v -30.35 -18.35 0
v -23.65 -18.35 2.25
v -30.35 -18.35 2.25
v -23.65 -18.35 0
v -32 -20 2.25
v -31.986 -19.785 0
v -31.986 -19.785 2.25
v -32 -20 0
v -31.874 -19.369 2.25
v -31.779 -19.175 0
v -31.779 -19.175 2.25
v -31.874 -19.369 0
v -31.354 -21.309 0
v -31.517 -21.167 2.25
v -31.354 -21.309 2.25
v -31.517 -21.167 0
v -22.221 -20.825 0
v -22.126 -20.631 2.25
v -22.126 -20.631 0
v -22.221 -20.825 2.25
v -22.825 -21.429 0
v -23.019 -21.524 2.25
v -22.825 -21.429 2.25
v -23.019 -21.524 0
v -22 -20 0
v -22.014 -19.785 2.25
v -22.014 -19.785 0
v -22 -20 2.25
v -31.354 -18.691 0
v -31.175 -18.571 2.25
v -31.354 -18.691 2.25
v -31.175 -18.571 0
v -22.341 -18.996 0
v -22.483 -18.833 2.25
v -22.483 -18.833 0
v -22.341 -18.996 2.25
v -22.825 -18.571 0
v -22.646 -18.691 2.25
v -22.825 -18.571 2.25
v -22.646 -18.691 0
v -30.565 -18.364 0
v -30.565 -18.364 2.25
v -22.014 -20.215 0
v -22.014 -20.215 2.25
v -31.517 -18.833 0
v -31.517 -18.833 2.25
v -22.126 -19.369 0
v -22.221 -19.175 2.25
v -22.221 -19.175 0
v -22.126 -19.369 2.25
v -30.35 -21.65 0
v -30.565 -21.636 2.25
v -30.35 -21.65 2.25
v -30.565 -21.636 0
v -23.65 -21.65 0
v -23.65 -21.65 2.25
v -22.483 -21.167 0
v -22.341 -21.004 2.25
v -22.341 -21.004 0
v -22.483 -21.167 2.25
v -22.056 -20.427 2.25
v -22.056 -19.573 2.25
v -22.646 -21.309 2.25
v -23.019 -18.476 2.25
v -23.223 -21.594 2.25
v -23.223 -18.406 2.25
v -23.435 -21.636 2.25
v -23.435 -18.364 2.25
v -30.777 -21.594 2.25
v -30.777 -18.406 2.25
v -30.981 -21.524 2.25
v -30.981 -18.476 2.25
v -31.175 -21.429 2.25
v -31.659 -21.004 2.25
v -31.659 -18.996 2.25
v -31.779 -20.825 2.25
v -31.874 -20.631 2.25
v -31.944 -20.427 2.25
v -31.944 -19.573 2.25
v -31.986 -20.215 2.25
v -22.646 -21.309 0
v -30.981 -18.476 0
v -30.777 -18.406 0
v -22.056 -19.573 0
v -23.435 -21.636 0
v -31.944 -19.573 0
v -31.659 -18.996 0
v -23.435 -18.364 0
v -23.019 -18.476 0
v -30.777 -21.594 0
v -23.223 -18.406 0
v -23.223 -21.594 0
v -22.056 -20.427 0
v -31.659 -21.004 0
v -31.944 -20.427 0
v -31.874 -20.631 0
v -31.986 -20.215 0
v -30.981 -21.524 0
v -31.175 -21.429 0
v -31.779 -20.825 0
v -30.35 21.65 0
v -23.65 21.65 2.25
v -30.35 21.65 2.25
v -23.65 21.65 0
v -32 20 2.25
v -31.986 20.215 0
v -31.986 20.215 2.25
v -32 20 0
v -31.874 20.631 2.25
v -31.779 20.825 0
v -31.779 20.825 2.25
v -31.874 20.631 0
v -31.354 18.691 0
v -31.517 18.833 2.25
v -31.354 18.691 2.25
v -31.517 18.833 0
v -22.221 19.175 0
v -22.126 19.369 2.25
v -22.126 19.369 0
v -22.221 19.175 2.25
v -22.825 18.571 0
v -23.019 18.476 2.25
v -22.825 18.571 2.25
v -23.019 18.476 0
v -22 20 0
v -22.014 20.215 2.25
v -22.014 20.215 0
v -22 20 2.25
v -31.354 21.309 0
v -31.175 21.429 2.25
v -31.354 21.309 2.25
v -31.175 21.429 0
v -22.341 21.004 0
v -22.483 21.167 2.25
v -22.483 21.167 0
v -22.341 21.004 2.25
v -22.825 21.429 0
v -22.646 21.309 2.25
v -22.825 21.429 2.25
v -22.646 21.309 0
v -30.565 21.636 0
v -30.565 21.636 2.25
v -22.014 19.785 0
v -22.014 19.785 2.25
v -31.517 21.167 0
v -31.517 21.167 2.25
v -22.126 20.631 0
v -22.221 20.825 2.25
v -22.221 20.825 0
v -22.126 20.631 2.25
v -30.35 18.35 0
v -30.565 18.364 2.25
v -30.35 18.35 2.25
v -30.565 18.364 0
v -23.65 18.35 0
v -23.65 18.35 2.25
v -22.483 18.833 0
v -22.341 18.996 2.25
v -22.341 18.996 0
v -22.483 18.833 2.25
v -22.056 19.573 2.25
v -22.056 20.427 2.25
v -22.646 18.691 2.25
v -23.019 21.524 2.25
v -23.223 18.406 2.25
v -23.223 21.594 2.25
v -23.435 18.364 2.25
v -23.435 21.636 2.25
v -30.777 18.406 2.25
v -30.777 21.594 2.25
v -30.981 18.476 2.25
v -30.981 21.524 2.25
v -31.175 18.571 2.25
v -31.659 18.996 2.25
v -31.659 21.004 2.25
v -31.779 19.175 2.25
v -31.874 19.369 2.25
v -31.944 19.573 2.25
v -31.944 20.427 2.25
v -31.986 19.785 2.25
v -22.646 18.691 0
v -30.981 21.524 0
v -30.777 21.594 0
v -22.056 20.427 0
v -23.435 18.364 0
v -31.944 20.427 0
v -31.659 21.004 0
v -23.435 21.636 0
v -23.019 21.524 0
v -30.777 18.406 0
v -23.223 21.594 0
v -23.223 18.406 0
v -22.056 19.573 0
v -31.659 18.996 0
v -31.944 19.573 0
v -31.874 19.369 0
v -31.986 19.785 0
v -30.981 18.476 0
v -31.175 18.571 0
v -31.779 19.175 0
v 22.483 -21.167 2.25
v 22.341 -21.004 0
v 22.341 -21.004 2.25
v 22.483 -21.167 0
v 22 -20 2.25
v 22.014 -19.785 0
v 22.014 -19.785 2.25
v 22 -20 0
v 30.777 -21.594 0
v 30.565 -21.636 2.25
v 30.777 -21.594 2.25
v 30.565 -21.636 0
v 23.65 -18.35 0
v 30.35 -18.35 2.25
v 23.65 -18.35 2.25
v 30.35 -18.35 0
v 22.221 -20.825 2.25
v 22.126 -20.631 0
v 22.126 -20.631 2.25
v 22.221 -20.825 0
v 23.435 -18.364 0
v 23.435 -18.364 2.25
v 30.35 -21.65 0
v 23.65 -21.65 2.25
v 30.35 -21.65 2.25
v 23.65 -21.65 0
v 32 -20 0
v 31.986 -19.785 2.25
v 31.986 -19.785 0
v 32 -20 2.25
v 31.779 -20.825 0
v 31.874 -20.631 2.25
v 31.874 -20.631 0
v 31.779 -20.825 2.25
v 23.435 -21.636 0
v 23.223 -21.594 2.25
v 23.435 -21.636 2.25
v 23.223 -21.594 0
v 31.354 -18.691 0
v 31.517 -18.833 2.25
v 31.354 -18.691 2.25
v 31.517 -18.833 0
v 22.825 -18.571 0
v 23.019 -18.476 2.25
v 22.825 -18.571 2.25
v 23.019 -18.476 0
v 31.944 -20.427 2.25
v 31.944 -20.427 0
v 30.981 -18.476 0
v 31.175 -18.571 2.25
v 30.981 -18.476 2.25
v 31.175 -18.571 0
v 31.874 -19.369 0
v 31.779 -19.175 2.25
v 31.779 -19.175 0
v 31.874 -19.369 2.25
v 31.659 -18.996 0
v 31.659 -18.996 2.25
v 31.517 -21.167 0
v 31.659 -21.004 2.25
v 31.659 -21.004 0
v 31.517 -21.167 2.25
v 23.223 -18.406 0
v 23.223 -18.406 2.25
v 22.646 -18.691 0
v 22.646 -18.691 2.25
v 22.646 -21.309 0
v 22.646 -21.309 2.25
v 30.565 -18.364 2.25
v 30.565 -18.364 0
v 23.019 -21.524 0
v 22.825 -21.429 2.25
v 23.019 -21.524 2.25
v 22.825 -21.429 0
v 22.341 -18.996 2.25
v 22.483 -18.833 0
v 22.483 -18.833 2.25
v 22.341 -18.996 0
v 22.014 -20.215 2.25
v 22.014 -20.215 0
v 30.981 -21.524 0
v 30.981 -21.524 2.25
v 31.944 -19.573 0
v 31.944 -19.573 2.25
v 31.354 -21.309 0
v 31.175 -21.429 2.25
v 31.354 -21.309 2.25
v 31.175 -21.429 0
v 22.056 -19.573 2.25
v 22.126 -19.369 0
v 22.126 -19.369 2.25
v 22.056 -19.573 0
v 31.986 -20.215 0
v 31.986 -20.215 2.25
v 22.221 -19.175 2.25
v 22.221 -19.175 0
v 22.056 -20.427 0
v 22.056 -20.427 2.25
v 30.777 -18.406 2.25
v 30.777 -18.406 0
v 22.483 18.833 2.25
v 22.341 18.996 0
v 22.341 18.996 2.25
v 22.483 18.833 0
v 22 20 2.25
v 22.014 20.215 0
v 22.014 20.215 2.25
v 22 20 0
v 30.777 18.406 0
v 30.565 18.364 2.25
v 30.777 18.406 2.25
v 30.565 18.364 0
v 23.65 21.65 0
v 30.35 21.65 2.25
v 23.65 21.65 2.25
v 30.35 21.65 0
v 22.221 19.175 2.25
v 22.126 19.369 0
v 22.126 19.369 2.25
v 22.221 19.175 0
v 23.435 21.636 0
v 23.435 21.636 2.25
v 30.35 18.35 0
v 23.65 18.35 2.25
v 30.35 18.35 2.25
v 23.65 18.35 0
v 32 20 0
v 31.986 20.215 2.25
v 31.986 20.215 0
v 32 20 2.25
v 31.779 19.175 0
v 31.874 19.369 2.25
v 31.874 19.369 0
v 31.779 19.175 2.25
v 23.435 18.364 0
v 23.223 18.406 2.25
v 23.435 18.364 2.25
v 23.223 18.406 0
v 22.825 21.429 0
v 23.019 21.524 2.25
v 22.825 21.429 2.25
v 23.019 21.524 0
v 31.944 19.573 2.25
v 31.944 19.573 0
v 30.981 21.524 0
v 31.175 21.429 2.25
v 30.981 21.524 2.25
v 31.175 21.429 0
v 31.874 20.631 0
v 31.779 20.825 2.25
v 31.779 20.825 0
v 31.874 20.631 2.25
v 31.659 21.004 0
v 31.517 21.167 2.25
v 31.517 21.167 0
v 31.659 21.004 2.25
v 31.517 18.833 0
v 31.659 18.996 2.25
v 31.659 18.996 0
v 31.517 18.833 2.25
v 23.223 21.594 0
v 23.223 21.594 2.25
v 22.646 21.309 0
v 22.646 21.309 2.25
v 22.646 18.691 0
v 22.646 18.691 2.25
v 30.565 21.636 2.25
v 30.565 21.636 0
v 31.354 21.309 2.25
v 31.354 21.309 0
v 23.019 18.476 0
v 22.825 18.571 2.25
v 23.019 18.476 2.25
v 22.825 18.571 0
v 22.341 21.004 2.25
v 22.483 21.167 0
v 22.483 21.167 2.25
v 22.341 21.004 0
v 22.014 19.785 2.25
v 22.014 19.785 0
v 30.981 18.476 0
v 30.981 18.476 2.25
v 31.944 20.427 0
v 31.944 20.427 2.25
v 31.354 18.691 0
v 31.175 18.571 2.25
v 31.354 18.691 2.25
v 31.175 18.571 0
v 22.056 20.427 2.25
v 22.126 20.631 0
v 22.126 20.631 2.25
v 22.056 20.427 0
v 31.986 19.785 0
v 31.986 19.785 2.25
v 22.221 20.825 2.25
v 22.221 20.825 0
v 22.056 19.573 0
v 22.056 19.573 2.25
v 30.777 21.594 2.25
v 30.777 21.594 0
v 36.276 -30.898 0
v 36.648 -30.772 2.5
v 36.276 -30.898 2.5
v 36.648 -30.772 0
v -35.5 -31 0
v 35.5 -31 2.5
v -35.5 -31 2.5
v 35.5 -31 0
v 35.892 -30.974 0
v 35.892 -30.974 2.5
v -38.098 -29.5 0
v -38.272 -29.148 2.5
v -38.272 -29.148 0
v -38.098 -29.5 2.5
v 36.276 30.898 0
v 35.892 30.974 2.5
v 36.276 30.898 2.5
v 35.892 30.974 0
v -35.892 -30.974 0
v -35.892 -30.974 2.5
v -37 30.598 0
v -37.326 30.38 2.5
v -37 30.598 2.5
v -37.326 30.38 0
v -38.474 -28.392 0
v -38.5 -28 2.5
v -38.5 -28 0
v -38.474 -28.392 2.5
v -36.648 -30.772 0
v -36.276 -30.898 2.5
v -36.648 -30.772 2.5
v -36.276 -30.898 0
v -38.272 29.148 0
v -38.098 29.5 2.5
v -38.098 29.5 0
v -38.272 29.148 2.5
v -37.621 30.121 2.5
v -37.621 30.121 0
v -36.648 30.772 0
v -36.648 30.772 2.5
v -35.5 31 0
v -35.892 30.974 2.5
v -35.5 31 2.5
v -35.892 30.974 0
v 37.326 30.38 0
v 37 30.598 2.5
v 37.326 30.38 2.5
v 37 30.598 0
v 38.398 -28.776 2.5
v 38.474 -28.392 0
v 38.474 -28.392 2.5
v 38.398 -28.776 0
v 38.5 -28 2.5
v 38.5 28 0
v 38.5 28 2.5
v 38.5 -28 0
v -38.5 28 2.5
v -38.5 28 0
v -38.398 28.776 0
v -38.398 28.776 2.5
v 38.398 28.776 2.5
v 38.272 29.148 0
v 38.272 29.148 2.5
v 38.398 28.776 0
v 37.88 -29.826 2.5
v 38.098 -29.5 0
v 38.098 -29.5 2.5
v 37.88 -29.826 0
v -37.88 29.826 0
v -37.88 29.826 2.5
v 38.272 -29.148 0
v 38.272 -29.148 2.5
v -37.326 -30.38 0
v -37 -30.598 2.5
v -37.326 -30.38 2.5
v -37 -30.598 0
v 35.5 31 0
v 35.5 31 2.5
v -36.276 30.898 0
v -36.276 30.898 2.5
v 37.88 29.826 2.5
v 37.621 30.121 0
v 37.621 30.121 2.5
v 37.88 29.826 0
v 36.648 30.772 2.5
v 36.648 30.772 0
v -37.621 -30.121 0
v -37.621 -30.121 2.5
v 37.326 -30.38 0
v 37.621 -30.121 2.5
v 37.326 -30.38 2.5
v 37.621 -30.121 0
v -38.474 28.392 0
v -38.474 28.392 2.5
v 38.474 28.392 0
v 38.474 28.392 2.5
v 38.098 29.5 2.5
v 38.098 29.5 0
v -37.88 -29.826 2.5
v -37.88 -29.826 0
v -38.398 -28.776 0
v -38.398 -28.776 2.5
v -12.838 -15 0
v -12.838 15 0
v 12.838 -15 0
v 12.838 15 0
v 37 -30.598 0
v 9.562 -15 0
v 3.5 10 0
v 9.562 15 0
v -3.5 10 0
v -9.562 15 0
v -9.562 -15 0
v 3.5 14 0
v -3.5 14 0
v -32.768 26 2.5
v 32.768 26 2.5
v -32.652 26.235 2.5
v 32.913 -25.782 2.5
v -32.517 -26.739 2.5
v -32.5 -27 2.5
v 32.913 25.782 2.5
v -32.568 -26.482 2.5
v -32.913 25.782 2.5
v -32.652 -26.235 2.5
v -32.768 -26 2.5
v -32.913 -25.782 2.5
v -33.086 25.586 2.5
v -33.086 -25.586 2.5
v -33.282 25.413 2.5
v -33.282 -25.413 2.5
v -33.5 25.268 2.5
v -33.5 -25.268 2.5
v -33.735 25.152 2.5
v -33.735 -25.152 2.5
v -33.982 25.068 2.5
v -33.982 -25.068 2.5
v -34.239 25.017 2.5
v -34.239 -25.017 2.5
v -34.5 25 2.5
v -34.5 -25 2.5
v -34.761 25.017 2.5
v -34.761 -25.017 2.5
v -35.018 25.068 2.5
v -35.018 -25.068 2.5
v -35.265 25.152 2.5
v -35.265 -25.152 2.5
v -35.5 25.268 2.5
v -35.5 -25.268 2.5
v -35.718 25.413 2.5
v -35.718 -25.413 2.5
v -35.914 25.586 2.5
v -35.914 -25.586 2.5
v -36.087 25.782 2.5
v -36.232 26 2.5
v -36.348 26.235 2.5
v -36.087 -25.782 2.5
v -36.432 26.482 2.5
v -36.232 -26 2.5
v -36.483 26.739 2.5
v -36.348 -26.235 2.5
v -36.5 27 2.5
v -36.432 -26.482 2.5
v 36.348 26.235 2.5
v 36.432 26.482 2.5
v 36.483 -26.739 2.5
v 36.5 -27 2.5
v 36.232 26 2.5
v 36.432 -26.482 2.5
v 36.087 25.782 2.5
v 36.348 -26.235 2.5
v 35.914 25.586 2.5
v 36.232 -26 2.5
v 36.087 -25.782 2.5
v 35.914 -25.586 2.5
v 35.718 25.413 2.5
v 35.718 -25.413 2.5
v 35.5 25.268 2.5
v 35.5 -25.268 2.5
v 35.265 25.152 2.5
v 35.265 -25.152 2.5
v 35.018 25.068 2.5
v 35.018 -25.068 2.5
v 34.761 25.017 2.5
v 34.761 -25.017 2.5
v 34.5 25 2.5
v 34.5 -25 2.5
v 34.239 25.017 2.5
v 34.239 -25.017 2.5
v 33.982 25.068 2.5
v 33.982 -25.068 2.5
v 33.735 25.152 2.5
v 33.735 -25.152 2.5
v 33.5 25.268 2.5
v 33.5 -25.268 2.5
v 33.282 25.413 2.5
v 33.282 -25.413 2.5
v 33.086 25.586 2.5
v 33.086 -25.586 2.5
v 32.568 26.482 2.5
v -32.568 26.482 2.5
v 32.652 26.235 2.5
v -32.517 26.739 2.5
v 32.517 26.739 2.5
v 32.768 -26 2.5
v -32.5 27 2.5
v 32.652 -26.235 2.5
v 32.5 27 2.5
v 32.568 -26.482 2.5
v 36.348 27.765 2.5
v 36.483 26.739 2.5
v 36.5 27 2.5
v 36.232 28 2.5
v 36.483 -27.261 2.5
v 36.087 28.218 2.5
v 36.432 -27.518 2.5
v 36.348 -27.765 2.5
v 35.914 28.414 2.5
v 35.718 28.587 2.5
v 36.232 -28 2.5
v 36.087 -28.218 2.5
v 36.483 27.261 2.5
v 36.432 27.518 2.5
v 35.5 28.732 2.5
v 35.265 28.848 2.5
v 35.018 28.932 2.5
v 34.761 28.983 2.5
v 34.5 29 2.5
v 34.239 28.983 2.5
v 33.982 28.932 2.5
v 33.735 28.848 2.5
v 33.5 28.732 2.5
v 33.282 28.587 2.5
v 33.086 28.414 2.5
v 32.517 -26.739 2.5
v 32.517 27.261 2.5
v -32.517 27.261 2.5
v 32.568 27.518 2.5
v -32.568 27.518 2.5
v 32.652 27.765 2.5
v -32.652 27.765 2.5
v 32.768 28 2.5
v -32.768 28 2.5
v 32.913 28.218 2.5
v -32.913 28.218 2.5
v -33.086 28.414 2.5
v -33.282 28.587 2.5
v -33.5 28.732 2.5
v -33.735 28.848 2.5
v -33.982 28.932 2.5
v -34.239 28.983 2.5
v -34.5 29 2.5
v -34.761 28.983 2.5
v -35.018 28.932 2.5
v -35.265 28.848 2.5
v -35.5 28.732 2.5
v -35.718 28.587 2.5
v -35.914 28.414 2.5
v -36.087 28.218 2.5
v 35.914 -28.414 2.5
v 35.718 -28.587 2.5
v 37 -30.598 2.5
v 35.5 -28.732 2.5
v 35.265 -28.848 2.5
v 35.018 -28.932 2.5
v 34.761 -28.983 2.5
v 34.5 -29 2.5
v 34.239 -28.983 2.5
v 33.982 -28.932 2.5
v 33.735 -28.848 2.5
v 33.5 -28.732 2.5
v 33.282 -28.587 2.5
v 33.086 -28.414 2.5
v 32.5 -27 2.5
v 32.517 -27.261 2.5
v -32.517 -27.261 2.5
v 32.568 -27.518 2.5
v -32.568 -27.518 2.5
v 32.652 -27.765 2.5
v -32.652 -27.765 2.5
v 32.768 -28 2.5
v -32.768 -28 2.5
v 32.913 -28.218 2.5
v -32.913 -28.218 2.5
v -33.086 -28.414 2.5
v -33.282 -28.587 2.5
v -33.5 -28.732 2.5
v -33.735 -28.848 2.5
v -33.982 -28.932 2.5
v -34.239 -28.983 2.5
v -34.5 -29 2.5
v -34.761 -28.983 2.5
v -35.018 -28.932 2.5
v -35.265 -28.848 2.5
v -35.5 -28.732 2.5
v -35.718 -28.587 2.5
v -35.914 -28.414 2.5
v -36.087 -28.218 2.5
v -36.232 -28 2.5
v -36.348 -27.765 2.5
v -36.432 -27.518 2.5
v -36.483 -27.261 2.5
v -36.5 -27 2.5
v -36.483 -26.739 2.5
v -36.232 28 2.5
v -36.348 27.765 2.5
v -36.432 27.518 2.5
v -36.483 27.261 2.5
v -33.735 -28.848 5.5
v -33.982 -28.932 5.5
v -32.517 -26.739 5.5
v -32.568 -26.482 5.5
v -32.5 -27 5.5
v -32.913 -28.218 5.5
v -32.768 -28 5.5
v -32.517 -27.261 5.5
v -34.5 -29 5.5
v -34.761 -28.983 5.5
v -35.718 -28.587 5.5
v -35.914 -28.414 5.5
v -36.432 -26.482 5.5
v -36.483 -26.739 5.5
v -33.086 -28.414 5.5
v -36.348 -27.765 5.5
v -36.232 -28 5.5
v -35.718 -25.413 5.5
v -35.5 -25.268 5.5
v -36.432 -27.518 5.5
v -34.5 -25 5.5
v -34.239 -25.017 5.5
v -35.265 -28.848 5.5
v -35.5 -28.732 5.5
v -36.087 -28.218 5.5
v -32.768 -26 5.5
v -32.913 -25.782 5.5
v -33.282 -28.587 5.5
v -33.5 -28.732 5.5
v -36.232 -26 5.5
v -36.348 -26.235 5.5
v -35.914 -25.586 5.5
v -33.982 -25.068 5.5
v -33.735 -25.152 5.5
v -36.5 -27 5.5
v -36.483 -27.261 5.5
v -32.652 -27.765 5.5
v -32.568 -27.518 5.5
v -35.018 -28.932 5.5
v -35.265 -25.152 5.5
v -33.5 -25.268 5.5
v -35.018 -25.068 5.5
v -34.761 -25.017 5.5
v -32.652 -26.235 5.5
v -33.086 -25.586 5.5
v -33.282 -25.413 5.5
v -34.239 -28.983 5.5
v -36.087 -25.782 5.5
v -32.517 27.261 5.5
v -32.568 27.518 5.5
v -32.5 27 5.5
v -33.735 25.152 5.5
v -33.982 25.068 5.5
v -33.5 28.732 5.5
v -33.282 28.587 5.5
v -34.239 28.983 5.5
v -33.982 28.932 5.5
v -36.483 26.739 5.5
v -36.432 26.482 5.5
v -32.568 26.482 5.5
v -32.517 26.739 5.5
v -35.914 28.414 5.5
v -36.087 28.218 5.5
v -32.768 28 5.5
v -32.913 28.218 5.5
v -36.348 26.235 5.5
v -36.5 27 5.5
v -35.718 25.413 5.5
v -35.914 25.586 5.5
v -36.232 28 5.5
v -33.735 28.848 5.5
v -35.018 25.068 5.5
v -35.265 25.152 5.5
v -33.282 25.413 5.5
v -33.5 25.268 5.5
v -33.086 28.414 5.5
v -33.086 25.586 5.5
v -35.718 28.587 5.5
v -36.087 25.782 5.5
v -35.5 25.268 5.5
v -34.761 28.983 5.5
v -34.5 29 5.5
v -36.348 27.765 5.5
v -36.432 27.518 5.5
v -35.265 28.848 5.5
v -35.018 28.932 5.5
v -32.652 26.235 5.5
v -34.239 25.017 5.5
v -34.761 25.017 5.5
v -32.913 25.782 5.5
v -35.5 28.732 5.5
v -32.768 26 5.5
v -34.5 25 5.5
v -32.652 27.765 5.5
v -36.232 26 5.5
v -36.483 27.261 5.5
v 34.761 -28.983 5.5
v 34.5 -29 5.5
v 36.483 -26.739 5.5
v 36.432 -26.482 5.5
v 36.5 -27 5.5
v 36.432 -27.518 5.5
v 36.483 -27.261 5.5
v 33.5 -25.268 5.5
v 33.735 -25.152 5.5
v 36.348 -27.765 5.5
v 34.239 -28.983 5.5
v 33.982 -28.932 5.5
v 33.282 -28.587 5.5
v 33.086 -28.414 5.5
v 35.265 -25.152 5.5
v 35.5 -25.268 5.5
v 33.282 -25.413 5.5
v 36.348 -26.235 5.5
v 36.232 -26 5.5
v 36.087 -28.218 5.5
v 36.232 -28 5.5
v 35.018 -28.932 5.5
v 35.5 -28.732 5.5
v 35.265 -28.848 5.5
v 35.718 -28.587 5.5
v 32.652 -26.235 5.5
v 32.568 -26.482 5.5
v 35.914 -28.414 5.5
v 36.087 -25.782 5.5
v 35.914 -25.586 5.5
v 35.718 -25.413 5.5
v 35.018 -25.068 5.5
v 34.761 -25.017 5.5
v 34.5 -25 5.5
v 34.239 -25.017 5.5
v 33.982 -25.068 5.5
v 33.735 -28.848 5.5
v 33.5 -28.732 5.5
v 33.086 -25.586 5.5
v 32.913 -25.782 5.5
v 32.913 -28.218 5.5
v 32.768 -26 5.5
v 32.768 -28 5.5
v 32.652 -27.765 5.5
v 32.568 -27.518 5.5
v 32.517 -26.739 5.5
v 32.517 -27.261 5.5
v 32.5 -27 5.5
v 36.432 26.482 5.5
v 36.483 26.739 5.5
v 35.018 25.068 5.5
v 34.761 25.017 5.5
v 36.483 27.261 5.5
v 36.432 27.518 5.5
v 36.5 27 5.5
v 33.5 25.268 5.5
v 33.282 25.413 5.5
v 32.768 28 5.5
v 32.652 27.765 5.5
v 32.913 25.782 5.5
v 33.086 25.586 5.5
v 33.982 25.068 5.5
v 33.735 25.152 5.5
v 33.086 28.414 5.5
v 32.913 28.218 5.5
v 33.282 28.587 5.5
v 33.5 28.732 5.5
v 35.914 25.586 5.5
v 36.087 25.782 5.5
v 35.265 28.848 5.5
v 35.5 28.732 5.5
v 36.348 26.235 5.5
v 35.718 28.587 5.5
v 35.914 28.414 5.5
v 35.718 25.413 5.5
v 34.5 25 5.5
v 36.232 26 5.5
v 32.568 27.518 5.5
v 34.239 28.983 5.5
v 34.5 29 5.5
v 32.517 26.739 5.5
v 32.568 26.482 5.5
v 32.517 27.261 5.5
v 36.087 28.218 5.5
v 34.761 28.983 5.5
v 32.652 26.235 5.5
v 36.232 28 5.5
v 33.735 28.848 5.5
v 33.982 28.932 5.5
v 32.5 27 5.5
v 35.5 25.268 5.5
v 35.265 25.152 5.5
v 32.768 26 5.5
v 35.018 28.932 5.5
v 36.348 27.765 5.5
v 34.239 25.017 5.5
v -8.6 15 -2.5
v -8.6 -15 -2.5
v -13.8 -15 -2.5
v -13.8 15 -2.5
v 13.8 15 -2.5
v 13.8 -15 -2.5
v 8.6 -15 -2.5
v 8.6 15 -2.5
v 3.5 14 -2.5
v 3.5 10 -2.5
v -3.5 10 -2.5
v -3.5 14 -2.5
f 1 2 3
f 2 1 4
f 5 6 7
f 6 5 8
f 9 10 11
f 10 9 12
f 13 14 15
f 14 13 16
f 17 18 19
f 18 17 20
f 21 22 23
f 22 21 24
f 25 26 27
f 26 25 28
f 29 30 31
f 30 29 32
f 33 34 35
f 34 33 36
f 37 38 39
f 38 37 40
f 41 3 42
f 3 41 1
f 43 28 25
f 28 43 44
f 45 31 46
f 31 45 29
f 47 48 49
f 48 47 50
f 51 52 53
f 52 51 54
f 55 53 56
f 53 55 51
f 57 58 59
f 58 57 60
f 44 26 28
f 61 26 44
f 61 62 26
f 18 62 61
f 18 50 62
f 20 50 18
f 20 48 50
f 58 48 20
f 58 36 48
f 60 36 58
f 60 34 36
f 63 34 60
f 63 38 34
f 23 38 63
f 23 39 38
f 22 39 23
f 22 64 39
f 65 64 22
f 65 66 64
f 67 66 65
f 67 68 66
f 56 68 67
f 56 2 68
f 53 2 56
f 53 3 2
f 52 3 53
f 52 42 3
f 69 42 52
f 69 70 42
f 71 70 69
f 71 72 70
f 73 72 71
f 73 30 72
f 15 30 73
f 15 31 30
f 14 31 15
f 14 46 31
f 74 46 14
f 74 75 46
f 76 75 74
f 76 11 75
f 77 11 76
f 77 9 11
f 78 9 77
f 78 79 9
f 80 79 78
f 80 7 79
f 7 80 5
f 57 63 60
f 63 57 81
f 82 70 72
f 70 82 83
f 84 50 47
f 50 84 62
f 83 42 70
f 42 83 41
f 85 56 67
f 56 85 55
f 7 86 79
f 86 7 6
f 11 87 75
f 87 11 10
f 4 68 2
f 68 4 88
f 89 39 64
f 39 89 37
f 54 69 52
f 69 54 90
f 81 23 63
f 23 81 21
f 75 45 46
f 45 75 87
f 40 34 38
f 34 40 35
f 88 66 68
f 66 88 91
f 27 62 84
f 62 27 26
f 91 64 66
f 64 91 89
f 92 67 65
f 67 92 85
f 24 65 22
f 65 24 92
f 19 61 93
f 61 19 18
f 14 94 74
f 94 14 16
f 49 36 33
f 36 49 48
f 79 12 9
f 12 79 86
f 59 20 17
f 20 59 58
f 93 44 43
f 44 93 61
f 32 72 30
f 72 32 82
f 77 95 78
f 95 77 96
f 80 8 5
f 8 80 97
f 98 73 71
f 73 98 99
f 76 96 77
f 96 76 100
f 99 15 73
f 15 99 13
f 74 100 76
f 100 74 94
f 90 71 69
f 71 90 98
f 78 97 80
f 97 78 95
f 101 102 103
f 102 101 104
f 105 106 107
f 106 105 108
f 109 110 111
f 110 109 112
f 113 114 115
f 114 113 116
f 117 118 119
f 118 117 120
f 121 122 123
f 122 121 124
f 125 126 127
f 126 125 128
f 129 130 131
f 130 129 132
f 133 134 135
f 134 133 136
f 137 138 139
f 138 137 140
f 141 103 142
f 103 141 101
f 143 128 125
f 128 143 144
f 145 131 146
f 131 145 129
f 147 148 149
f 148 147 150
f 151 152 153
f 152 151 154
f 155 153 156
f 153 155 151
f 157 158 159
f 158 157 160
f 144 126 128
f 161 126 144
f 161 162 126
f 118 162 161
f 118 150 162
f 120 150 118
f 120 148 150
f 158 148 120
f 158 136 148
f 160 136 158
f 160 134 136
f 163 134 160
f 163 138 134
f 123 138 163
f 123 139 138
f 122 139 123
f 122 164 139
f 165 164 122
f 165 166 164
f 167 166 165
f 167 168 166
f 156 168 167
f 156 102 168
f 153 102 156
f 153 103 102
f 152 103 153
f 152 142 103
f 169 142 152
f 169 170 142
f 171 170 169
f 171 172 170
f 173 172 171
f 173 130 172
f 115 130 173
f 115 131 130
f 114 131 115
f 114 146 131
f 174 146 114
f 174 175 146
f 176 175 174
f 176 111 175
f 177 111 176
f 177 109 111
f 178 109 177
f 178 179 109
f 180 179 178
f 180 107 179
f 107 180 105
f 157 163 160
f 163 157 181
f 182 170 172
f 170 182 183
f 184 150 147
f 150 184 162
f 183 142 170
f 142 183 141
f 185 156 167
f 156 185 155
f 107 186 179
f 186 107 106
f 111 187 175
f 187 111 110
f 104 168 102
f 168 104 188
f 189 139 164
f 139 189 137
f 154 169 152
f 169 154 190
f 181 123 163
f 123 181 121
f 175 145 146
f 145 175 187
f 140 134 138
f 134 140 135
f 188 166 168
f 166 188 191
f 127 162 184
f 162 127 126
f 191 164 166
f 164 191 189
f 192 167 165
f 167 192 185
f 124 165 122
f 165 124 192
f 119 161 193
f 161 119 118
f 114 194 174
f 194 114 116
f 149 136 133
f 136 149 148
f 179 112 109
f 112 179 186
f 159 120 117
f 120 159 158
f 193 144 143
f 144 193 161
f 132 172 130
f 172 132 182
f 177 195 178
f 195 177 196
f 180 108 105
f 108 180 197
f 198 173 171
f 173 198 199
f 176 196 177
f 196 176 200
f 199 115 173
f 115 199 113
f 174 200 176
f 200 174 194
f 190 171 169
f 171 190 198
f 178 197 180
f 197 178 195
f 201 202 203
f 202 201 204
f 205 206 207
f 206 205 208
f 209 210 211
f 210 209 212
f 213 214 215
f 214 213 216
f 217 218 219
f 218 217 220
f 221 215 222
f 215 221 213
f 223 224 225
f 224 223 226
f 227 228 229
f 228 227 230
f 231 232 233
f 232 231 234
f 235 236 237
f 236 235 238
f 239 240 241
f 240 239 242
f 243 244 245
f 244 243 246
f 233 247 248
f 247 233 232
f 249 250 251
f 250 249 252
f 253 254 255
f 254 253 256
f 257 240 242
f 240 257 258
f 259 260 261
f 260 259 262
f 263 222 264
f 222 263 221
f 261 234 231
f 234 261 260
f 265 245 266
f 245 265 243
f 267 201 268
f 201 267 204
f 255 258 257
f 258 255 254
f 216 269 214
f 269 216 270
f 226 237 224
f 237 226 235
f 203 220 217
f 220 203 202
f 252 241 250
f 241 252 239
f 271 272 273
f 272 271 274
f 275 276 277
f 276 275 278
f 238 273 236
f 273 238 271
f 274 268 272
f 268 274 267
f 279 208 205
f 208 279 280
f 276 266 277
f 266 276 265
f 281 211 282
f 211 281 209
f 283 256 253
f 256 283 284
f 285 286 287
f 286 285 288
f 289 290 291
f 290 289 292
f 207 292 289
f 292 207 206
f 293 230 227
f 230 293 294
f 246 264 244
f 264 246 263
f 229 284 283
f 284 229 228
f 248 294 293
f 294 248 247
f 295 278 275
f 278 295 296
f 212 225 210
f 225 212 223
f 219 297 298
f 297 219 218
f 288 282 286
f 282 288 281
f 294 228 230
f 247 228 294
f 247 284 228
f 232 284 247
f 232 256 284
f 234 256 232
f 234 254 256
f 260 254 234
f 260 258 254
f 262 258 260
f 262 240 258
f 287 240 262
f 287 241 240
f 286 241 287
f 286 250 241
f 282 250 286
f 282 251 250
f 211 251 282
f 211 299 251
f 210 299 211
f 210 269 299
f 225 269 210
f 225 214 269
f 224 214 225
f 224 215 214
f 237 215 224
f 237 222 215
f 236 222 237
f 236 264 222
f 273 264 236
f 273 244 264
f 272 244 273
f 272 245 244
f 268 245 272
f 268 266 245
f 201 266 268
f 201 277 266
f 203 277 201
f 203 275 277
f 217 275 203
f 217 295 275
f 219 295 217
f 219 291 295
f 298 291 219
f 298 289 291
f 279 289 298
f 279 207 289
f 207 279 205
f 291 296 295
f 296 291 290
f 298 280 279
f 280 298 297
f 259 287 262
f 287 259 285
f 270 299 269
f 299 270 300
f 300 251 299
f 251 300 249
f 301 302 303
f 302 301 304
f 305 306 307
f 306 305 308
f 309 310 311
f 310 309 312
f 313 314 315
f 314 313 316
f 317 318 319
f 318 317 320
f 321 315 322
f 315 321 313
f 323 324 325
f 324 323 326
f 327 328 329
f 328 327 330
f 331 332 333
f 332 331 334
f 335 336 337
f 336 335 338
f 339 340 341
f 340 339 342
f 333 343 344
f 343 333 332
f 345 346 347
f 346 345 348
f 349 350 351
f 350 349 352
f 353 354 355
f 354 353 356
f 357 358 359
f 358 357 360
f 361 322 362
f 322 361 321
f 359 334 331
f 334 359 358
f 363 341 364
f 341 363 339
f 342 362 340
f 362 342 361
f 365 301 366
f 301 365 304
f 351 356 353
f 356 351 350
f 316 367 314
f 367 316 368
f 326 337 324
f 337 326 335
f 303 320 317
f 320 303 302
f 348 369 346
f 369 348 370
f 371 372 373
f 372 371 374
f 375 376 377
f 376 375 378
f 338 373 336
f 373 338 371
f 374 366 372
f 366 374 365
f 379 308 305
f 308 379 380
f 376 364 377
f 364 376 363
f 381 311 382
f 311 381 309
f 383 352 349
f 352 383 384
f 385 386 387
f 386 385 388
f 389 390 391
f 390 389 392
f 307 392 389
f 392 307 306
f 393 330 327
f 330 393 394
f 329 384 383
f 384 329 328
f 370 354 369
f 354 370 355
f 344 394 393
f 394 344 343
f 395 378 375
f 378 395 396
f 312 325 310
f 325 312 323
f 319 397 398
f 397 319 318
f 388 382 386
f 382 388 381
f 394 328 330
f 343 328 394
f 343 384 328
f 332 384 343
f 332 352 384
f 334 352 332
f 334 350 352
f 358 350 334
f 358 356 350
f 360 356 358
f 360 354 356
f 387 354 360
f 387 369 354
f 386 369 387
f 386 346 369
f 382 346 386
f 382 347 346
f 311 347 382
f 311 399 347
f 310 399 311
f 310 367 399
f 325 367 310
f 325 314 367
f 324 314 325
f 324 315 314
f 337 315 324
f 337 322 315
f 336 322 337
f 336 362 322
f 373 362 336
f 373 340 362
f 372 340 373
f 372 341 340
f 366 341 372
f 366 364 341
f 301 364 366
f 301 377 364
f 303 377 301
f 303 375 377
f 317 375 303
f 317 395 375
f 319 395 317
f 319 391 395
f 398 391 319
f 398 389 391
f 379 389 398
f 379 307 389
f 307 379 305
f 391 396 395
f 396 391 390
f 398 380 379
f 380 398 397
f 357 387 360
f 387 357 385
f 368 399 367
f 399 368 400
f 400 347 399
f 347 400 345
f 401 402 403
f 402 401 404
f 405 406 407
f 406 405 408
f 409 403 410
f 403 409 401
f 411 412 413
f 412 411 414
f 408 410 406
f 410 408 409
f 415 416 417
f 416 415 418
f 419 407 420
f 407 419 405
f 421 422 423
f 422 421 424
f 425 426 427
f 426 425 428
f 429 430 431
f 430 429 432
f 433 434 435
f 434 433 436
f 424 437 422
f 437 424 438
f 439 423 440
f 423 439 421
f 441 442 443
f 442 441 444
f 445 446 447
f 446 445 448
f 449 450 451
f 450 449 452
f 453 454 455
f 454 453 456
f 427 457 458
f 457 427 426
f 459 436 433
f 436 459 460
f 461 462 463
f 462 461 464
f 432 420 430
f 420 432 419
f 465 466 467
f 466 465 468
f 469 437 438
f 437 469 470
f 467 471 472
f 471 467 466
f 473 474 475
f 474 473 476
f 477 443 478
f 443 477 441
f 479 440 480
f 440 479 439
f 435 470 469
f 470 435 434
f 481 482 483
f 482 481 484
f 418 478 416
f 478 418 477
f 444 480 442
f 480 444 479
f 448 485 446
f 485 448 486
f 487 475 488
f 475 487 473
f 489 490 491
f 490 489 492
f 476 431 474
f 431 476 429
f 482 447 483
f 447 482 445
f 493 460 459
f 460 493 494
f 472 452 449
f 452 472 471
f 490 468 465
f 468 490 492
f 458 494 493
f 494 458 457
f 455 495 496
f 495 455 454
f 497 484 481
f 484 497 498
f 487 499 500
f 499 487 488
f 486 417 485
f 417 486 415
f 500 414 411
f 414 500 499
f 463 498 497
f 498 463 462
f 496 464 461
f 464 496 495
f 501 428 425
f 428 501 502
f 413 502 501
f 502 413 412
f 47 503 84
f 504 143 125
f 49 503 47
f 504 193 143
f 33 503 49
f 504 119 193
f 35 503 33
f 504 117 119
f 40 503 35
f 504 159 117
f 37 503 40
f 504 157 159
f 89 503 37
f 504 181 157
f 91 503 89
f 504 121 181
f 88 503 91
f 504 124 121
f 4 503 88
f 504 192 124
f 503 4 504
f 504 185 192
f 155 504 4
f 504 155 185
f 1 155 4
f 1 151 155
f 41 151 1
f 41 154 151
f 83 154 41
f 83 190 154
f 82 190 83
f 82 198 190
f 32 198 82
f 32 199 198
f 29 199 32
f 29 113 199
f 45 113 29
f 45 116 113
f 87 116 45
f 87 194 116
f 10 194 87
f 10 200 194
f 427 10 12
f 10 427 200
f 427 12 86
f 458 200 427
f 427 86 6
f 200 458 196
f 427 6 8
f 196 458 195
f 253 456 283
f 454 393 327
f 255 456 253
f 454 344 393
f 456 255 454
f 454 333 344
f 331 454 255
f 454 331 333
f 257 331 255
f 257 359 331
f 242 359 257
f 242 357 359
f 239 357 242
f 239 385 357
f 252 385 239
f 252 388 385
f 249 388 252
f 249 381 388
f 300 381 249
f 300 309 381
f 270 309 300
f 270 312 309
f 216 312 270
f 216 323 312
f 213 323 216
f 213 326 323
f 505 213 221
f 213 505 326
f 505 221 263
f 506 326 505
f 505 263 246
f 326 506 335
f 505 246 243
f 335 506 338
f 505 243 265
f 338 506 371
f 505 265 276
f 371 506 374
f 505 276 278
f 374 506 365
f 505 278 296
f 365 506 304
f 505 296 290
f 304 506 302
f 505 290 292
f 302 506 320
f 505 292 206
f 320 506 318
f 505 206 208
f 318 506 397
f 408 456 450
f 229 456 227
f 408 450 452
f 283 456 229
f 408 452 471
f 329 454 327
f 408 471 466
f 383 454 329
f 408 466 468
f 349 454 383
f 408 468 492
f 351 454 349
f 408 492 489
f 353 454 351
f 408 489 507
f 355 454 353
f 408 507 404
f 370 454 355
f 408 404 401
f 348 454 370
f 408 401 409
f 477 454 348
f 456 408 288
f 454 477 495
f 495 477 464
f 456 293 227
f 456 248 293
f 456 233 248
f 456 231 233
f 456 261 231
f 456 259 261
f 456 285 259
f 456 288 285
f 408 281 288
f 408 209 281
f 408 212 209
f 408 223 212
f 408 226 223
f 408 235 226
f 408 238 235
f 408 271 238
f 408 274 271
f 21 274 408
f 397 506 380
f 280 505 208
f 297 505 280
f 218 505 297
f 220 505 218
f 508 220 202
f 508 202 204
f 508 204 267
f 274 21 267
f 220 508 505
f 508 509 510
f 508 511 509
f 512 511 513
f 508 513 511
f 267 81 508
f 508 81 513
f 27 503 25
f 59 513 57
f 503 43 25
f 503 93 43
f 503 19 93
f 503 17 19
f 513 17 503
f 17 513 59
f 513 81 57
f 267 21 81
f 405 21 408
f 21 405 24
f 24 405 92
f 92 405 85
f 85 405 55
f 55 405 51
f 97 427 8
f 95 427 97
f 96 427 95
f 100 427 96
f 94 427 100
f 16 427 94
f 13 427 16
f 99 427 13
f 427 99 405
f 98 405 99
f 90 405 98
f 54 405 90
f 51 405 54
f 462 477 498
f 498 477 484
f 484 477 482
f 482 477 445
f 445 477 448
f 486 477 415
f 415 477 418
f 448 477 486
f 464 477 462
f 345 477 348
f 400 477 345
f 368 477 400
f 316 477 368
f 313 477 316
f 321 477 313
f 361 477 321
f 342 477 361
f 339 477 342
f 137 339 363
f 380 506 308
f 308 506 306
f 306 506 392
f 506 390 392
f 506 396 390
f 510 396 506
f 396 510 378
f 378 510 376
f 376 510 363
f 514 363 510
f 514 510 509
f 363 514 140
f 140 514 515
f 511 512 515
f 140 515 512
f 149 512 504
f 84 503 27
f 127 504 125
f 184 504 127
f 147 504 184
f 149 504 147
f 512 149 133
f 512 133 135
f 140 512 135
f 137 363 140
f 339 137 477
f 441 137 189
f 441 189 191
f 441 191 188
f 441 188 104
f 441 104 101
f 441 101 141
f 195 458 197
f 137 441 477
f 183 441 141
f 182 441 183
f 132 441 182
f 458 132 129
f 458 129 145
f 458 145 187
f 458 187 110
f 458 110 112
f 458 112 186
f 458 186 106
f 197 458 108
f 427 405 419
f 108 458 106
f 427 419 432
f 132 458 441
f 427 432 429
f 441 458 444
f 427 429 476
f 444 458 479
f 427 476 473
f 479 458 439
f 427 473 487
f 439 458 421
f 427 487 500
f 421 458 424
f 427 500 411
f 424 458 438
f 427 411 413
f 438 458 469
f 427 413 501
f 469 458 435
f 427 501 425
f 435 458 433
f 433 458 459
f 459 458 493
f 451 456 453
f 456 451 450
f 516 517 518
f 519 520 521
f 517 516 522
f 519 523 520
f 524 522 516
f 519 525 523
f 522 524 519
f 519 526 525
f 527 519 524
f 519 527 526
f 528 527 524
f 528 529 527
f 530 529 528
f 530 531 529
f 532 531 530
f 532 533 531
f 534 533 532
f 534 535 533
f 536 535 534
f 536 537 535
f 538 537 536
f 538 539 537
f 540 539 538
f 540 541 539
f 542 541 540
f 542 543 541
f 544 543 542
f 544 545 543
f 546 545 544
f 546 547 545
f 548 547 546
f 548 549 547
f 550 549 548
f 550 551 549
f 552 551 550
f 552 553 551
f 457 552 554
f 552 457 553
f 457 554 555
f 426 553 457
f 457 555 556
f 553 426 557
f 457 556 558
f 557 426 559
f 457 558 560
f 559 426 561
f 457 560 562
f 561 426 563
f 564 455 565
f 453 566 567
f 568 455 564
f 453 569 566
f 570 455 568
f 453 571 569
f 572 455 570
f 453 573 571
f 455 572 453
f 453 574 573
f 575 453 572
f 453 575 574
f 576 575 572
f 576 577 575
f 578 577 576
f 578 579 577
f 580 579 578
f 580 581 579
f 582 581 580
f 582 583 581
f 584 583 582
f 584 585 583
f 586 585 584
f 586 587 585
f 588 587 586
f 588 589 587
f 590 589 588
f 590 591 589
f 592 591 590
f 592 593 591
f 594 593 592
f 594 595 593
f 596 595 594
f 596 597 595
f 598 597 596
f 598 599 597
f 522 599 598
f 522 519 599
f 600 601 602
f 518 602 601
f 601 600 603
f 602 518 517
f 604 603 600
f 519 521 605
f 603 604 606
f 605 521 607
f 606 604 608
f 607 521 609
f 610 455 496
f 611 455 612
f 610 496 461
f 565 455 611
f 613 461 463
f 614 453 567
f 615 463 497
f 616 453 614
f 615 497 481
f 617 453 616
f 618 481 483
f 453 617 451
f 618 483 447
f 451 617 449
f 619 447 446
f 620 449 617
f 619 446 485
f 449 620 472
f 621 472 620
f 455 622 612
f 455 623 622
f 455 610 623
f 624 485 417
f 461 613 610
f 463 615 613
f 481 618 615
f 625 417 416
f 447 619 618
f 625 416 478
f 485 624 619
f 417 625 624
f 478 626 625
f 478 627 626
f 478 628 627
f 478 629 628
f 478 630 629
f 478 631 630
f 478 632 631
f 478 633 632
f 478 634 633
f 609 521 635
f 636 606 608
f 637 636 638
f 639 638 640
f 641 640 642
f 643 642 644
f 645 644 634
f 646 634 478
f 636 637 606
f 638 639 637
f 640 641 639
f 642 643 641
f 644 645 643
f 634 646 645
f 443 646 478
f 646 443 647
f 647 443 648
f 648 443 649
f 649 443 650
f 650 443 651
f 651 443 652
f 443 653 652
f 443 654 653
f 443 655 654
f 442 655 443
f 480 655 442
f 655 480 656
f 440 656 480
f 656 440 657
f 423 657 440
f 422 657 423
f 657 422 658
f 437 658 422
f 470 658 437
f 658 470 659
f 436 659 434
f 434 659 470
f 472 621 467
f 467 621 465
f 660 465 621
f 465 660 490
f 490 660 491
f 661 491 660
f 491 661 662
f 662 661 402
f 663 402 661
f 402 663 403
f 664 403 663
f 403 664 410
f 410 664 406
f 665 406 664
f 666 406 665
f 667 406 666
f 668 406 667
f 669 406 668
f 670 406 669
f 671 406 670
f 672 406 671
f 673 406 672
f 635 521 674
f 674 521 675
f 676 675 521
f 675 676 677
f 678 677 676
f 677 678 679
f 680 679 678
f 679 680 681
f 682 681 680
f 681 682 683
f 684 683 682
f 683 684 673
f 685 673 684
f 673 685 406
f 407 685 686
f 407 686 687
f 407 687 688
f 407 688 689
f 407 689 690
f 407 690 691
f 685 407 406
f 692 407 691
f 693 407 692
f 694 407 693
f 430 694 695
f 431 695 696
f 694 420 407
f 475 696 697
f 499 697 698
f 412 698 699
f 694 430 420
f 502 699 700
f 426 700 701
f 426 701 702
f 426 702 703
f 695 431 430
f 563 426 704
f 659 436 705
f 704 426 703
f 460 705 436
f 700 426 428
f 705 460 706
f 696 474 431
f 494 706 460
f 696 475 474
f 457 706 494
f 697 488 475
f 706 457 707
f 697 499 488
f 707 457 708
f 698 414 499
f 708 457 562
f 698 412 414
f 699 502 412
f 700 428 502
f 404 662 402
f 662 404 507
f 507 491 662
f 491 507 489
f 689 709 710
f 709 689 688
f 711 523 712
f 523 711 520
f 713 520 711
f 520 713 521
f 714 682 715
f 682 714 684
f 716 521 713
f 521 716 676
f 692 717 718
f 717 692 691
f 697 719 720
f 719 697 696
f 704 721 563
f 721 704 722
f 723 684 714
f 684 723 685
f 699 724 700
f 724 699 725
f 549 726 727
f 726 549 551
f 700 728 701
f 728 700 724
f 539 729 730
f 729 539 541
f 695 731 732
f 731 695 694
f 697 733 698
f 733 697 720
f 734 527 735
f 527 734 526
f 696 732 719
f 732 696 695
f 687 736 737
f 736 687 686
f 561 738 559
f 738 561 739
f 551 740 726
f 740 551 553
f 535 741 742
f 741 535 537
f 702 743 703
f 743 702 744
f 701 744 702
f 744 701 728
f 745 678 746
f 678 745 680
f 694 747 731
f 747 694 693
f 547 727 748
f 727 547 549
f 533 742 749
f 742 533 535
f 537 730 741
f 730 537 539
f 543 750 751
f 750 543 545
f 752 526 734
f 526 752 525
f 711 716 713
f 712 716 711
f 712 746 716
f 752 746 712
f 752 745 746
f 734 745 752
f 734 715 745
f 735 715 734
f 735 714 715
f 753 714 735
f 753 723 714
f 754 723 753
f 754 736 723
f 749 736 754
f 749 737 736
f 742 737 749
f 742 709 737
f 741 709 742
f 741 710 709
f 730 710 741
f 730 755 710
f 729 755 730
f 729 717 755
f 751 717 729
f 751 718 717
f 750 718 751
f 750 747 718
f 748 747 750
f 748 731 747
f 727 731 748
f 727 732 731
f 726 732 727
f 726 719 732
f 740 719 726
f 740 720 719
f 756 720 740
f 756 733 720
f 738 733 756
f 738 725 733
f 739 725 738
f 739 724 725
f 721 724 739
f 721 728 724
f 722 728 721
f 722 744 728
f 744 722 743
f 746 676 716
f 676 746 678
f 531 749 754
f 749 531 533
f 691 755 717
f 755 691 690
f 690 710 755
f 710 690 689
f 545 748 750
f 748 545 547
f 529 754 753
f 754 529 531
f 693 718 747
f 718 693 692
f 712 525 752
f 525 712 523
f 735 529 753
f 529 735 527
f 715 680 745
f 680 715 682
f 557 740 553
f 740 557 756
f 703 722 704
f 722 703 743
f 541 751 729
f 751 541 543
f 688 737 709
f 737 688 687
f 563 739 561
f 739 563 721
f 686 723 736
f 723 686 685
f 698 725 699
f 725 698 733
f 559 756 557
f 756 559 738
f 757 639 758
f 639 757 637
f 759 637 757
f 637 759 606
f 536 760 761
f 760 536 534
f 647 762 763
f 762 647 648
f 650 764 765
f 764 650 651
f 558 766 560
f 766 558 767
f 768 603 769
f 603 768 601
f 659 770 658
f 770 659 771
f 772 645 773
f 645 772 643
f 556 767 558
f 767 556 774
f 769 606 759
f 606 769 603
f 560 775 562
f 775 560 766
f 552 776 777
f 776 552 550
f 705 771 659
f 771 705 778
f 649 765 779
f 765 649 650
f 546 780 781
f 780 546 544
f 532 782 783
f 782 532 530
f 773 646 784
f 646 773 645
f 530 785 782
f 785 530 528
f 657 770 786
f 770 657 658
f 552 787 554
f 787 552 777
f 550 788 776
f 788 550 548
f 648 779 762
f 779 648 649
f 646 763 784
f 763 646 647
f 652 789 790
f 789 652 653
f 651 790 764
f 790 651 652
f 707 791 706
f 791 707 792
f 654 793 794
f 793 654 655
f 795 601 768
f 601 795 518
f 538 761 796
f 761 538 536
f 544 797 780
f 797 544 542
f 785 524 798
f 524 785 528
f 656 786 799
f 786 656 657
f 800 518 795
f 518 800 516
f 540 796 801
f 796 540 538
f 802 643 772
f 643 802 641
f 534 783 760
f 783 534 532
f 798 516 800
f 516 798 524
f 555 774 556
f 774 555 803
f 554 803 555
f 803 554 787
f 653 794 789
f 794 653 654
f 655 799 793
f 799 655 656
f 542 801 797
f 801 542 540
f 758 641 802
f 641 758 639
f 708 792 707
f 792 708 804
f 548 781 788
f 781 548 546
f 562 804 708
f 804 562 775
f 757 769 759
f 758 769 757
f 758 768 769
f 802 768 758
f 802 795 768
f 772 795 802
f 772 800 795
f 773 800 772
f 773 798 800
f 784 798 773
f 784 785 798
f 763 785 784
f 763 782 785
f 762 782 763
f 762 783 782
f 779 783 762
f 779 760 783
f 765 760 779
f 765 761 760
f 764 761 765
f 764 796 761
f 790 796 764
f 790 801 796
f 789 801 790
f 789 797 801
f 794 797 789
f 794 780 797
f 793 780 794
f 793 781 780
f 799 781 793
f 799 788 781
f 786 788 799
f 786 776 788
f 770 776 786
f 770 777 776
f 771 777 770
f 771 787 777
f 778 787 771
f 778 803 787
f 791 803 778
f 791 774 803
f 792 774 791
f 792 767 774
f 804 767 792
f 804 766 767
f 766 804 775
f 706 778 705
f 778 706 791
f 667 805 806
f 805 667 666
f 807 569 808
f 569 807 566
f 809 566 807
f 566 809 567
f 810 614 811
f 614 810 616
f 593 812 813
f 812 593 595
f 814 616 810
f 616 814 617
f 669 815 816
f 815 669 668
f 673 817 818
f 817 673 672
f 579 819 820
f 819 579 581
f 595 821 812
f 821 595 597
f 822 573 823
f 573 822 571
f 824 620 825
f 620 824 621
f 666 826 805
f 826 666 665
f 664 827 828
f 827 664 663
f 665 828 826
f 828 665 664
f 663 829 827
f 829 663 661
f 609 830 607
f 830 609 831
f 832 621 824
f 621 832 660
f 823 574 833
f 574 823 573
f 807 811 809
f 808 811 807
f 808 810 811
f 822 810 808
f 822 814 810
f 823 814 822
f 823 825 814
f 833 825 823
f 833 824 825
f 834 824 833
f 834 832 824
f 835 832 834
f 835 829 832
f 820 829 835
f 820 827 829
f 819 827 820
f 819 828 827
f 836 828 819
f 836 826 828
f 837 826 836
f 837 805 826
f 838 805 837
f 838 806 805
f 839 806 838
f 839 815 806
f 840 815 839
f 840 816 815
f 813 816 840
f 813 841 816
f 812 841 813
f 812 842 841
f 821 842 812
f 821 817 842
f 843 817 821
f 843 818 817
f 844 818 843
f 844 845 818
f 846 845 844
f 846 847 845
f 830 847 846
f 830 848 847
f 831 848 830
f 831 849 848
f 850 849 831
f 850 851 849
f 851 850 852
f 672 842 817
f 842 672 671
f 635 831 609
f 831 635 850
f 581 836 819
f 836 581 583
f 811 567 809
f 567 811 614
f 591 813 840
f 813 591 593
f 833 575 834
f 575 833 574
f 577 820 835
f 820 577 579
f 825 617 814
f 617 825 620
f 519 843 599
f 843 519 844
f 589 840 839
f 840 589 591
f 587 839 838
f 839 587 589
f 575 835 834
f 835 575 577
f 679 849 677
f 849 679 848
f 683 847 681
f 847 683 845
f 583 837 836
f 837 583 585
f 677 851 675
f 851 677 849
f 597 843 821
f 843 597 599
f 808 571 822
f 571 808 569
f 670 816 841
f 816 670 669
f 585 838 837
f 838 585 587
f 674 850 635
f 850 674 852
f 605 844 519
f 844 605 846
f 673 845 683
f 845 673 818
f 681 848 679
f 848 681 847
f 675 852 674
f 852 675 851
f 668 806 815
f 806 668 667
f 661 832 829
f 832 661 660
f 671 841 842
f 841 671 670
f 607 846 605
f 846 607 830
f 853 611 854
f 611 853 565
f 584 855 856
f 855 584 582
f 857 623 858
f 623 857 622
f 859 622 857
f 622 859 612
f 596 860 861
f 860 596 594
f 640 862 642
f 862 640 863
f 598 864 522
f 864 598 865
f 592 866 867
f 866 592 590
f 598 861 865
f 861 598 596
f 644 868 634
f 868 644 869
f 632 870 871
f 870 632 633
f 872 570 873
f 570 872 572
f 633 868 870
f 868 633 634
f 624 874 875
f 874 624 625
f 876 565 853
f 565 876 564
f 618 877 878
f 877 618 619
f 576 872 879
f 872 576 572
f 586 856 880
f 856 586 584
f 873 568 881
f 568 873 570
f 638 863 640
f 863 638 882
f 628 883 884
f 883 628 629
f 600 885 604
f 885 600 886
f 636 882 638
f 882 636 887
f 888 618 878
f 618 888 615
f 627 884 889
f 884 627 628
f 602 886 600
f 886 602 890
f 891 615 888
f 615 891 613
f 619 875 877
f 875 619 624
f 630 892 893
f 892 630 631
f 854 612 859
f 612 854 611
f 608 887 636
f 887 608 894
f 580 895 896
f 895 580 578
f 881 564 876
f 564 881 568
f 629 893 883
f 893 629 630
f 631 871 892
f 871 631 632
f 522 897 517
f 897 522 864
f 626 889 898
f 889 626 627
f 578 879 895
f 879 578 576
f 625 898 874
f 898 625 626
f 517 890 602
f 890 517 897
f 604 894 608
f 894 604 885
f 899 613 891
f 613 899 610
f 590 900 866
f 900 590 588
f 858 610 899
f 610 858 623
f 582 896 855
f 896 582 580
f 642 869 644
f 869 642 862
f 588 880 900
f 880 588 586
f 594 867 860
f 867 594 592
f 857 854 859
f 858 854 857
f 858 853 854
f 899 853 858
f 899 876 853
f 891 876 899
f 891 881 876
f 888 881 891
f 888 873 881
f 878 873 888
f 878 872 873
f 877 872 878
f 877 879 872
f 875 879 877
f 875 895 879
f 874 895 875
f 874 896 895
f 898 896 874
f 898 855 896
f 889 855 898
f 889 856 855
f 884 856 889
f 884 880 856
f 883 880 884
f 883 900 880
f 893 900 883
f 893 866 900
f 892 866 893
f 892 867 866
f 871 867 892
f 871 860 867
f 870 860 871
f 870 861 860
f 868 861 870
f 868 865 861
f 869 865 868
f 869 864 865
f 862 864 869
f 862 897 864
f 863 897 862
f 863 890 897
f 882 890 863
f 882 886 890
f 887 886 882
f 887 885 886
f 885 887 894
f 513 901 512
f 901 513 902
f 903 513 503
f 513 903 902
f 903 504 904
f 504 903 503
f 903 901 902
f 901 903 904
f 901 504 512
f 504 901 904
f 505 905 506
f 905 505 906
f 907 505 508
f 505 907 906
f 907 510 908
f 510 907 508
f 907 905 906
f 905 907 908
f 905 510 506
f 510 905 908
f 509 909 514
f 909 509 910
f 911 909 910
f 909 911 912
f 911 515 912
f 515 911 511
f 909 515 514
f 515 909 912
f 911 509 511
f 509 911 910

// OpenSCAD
// file: rm_common.scad
// RobotMind Modular Ecosystem — common library
// Rev A concept for FDM prototyping.
$fn = 48;

// ---- Global mechanical interface ----
RM_DOCK_W = 30;
RM_DOCK_L = 34;
RM_DOCK_H = 5;
RM_RAIL_H = 2.6;
RM_RAIL_W = 3.2;
RM_RAIL_INSET = 3.8;
RM_CLEARANCE = 0.28;   // FDM sliding clearance per side
RM_LATCH_W = 7;
RM_LATCH_L = 9;
RM_LATCH_T = 1.6;
RM_LATCH_HOOK = 1.1;
RM_M3 = 3.3;

module rounded_box(size=[20,20,3], r=2, center=false) {
    x=size[0]; y=size[1]; z=size[2];
    translate(center ? [-x/2,-y/2,-z/2] : [0,0,0])
    linear_extrude(height=z)
      offset(r=r)
      offset(delta=-r)
      square([x,y]);
}

// Male dovetail rail. The simplified trapezoid is robust in FDM and moldable.
module dovetail_rail(len=RM_DOCK_L-4) {
    w=RM_RAIL_W; h=RM_RAIL_H;
    linear_extrude(height=len)
      polygon(points=[[-w/2,0],[w/2,0],[w/2+1.0,h],[-w/2-1.0,h]]);
}

// Female channel cutter, slightly oversized.
module dovetail_channel(len=RM_DOCK_L) {
    w=RM_RAIL_W+2*RM_CLEARANCE; h=RM_RAIL_H+RM_CLEARANCE;
    linear_extrude(height=len)
      polygon(points=[[-w/2,0],[w/2,0],[w/2+1.15,h],[-w/2-1.15,h]]);
}

module male_interface() {
    // Interface origin centered X/Y at the carrier underside (Z=0).
    for (sx=[-1,1])
      translate([sx*(RM_DOCK_W/2-RM_RAIL_INSET), -RM_DOCK_L/2+2, 0.1])
        rotate([-90,0,0]) dovetail_rail();
    // central catch boss engaged by dock latch
    translate([-RM_LATCH_W/2, RM_DOCK_L/2-7, -RM_RAIL_H+0.1])
      cube([RM_LATCH_W,4,RM_RAIL_H]);
}

module dock_body_base() {
    difference(){
      rounded_box([RM_DOCK_W,RM_DOCK_L,RM_DOCK_H],2.2,center=true);
      // open female dovetails from insertion side
      for (sx=[-1,1])
        translate([sx*(RM_DOCK_W/2-RM_RAIL_INSET), -RM_DOCK_L/2-0.2, RM_DOCK_H/2])
          rotate([-90,0,0]) dovetail_channel(len=RM_DOCK_L+1);
      // four M3 mounting holes
      for(x=[-10.5,10.5], y=[-12,12]) translate([x,y,0]) cylinder(h=RM_DOCK_H+2,d=RM_M3,center=true);
      // latch relief window
      translate([-RM_LATCH_W/2-0.5, RM_DOCK_L/2-11, -RM_DOCK_H/2-0.1]) cube([RM_LATCH_W+1,11,RM_DOCK_H+1]);
    }
}

module latch_finger() {
    // flexible cantilever integrated at back of dock
    translate([-RM_LATCH_W/2, RM_DOCK_L/2-11.1, -RM_DOCK_H/2+0.7]) {
      cube([RM_LATCH_W,RM_LATCH_L,RM_LATCH_T]);
      translate([0,RM_LATCH_L-1.4,RM_LATCH_T]) cube([RM_LATCH_W,1.4,RM_LATCH_HOOK]);
      // thumb tab
      translate([-1.2,RM_LATCH_L-0.8,-0.2]) cube([RM_LATCH_W+2.4,3,RM_LATCH_T+0.4]);
    }
}

module universal_dock() {
    union(){ dock_body_base(); latch_finger(); }
}

module sensor_carrier(pcb=[20,20], wall=1.7, floor=1.8, clearance=0.5) {
    // carrier top tray centered; universal male interface below
    W=pcb[0]+2*(wall+clearance);
    L=pcb[1]+2*(wall+clearance);
    union(){
      translate([-W/2,-L/2,0]) difference(){
        rounded_box([W,L,floor+3.1],2);
        translate([wall,wall,floor]) rounded_box([pcb[0]+2*clearance,pcb[1]+2*clearance,5],1.0);
        // cable exit on front edge
        translate([W/2-6,-0.2,floor+0.5]) cube([12,wall+1,3.5]);
      }
      // small retention lips; gentle, printable snap
      for(x=[-W/2+2.2,W/2-2.2], y=[-L/2+2.2,L/2-2.2])
         translate([x,y,floor+2.5]) cylinder(h=1.3,d=2.2);
      male_interface();
    }
}

module tag_insert(tag=[60,60], border=3.0, t=1.0) {
    W=tag[0]+2*border; H=tag[1]+2*border;
    union(){
      translate([-W/2,-H/2,0]) rounded_box([W,H,t],1.2);
      translate([-8,-H/2-4,0]) rounded_box([16,5,t],1.2);
    }
}

module tag_insert_rails(tag=[60,60], border=4, rail=1.5, depth=2.2, clearance=0.25, lip=0.8, lip_t=0.6) {
    W=tag[0]+2*border; H=tag[1]+2*border;
    // Side channels capture the insert; the open -Y end matches the pull tab.
    for(sx=[-1,1]) {
      x=sx>0 ? W/2+clearance : -W/2-clearance-rail;
      translate([x,-H/2-clearance,0]) cube([rail,H+2*clearance+rail,depth]);
      translate([sx>0 ? W/2-lip : -W/2-clearance-rail,-H/2-clearance,depth-lip_t])
        cube([rail+clearance+lip,H+2*clearance+rail,lip_t]);
    }
    // Hard stop at +Y; side lips provide out-of-plane retention.
    translate([-W/2-clearance-rail,H/2+clearance,0]) cube([W+2*(clearance+rail),rail,depth]);
}

module angle_wedge(angle=15) {
    // solid wedge with top angled; child dock can be placed on top by caller
    W=RM_DOCK_W+4; L=RM_DOCK_L+4; min_h=3; dh=tan(angle)*L;
    polyhedron(points=[
      [-W/2,-L/2,0],[W/2,-L/2,0],[W/2,L/2,0],[-W/2,L/2,0],
      [-W/2,-L/2,min_h],[W/2,-L/2,min_h],[W/2,L/2,min_h+dh],[-W/2,L/2,min_h+dh]
    ], faces=[[0,1,2,3],[4,7,6,5],[0,4,5,1],[1,5,6,2],[2,6,7,3],[3,7,4,0]]);
}
// main file
include <rm_common.scad>
// Adjustable tray for an Arduino-UNO-format ESP32-S3 board + Grove shield stack.
BOARD=[69,54]; BASE_T=2.5;
difference(){
  translate([-BOARD[0]/2-4,-BOARD[1]/2-4,0]) rounded_box([BOARD[0]+8,BOARD[1]+8,BASE_T],3);
  // elongated mounting slots rather than assuming exact clone hole positions
  for(x=[-27,27], y=[-20,20]) translate([x,y,0]) linear_extrude(height=BASE_T+2,center=true) hull(){
    translate([-3.35,0]) circle(d=3.3);
    translate([3.35,0]) circle(d=3.3);
  }
}
// low corner retainers
for(x=[-BOARD[0]/2,BOARD[0]/2],y=[-BOARD[1]/2,BOARD[1]/2]) translate([x,y,BASE_T]) cylinder(h=3,d=4);
male_interface();
